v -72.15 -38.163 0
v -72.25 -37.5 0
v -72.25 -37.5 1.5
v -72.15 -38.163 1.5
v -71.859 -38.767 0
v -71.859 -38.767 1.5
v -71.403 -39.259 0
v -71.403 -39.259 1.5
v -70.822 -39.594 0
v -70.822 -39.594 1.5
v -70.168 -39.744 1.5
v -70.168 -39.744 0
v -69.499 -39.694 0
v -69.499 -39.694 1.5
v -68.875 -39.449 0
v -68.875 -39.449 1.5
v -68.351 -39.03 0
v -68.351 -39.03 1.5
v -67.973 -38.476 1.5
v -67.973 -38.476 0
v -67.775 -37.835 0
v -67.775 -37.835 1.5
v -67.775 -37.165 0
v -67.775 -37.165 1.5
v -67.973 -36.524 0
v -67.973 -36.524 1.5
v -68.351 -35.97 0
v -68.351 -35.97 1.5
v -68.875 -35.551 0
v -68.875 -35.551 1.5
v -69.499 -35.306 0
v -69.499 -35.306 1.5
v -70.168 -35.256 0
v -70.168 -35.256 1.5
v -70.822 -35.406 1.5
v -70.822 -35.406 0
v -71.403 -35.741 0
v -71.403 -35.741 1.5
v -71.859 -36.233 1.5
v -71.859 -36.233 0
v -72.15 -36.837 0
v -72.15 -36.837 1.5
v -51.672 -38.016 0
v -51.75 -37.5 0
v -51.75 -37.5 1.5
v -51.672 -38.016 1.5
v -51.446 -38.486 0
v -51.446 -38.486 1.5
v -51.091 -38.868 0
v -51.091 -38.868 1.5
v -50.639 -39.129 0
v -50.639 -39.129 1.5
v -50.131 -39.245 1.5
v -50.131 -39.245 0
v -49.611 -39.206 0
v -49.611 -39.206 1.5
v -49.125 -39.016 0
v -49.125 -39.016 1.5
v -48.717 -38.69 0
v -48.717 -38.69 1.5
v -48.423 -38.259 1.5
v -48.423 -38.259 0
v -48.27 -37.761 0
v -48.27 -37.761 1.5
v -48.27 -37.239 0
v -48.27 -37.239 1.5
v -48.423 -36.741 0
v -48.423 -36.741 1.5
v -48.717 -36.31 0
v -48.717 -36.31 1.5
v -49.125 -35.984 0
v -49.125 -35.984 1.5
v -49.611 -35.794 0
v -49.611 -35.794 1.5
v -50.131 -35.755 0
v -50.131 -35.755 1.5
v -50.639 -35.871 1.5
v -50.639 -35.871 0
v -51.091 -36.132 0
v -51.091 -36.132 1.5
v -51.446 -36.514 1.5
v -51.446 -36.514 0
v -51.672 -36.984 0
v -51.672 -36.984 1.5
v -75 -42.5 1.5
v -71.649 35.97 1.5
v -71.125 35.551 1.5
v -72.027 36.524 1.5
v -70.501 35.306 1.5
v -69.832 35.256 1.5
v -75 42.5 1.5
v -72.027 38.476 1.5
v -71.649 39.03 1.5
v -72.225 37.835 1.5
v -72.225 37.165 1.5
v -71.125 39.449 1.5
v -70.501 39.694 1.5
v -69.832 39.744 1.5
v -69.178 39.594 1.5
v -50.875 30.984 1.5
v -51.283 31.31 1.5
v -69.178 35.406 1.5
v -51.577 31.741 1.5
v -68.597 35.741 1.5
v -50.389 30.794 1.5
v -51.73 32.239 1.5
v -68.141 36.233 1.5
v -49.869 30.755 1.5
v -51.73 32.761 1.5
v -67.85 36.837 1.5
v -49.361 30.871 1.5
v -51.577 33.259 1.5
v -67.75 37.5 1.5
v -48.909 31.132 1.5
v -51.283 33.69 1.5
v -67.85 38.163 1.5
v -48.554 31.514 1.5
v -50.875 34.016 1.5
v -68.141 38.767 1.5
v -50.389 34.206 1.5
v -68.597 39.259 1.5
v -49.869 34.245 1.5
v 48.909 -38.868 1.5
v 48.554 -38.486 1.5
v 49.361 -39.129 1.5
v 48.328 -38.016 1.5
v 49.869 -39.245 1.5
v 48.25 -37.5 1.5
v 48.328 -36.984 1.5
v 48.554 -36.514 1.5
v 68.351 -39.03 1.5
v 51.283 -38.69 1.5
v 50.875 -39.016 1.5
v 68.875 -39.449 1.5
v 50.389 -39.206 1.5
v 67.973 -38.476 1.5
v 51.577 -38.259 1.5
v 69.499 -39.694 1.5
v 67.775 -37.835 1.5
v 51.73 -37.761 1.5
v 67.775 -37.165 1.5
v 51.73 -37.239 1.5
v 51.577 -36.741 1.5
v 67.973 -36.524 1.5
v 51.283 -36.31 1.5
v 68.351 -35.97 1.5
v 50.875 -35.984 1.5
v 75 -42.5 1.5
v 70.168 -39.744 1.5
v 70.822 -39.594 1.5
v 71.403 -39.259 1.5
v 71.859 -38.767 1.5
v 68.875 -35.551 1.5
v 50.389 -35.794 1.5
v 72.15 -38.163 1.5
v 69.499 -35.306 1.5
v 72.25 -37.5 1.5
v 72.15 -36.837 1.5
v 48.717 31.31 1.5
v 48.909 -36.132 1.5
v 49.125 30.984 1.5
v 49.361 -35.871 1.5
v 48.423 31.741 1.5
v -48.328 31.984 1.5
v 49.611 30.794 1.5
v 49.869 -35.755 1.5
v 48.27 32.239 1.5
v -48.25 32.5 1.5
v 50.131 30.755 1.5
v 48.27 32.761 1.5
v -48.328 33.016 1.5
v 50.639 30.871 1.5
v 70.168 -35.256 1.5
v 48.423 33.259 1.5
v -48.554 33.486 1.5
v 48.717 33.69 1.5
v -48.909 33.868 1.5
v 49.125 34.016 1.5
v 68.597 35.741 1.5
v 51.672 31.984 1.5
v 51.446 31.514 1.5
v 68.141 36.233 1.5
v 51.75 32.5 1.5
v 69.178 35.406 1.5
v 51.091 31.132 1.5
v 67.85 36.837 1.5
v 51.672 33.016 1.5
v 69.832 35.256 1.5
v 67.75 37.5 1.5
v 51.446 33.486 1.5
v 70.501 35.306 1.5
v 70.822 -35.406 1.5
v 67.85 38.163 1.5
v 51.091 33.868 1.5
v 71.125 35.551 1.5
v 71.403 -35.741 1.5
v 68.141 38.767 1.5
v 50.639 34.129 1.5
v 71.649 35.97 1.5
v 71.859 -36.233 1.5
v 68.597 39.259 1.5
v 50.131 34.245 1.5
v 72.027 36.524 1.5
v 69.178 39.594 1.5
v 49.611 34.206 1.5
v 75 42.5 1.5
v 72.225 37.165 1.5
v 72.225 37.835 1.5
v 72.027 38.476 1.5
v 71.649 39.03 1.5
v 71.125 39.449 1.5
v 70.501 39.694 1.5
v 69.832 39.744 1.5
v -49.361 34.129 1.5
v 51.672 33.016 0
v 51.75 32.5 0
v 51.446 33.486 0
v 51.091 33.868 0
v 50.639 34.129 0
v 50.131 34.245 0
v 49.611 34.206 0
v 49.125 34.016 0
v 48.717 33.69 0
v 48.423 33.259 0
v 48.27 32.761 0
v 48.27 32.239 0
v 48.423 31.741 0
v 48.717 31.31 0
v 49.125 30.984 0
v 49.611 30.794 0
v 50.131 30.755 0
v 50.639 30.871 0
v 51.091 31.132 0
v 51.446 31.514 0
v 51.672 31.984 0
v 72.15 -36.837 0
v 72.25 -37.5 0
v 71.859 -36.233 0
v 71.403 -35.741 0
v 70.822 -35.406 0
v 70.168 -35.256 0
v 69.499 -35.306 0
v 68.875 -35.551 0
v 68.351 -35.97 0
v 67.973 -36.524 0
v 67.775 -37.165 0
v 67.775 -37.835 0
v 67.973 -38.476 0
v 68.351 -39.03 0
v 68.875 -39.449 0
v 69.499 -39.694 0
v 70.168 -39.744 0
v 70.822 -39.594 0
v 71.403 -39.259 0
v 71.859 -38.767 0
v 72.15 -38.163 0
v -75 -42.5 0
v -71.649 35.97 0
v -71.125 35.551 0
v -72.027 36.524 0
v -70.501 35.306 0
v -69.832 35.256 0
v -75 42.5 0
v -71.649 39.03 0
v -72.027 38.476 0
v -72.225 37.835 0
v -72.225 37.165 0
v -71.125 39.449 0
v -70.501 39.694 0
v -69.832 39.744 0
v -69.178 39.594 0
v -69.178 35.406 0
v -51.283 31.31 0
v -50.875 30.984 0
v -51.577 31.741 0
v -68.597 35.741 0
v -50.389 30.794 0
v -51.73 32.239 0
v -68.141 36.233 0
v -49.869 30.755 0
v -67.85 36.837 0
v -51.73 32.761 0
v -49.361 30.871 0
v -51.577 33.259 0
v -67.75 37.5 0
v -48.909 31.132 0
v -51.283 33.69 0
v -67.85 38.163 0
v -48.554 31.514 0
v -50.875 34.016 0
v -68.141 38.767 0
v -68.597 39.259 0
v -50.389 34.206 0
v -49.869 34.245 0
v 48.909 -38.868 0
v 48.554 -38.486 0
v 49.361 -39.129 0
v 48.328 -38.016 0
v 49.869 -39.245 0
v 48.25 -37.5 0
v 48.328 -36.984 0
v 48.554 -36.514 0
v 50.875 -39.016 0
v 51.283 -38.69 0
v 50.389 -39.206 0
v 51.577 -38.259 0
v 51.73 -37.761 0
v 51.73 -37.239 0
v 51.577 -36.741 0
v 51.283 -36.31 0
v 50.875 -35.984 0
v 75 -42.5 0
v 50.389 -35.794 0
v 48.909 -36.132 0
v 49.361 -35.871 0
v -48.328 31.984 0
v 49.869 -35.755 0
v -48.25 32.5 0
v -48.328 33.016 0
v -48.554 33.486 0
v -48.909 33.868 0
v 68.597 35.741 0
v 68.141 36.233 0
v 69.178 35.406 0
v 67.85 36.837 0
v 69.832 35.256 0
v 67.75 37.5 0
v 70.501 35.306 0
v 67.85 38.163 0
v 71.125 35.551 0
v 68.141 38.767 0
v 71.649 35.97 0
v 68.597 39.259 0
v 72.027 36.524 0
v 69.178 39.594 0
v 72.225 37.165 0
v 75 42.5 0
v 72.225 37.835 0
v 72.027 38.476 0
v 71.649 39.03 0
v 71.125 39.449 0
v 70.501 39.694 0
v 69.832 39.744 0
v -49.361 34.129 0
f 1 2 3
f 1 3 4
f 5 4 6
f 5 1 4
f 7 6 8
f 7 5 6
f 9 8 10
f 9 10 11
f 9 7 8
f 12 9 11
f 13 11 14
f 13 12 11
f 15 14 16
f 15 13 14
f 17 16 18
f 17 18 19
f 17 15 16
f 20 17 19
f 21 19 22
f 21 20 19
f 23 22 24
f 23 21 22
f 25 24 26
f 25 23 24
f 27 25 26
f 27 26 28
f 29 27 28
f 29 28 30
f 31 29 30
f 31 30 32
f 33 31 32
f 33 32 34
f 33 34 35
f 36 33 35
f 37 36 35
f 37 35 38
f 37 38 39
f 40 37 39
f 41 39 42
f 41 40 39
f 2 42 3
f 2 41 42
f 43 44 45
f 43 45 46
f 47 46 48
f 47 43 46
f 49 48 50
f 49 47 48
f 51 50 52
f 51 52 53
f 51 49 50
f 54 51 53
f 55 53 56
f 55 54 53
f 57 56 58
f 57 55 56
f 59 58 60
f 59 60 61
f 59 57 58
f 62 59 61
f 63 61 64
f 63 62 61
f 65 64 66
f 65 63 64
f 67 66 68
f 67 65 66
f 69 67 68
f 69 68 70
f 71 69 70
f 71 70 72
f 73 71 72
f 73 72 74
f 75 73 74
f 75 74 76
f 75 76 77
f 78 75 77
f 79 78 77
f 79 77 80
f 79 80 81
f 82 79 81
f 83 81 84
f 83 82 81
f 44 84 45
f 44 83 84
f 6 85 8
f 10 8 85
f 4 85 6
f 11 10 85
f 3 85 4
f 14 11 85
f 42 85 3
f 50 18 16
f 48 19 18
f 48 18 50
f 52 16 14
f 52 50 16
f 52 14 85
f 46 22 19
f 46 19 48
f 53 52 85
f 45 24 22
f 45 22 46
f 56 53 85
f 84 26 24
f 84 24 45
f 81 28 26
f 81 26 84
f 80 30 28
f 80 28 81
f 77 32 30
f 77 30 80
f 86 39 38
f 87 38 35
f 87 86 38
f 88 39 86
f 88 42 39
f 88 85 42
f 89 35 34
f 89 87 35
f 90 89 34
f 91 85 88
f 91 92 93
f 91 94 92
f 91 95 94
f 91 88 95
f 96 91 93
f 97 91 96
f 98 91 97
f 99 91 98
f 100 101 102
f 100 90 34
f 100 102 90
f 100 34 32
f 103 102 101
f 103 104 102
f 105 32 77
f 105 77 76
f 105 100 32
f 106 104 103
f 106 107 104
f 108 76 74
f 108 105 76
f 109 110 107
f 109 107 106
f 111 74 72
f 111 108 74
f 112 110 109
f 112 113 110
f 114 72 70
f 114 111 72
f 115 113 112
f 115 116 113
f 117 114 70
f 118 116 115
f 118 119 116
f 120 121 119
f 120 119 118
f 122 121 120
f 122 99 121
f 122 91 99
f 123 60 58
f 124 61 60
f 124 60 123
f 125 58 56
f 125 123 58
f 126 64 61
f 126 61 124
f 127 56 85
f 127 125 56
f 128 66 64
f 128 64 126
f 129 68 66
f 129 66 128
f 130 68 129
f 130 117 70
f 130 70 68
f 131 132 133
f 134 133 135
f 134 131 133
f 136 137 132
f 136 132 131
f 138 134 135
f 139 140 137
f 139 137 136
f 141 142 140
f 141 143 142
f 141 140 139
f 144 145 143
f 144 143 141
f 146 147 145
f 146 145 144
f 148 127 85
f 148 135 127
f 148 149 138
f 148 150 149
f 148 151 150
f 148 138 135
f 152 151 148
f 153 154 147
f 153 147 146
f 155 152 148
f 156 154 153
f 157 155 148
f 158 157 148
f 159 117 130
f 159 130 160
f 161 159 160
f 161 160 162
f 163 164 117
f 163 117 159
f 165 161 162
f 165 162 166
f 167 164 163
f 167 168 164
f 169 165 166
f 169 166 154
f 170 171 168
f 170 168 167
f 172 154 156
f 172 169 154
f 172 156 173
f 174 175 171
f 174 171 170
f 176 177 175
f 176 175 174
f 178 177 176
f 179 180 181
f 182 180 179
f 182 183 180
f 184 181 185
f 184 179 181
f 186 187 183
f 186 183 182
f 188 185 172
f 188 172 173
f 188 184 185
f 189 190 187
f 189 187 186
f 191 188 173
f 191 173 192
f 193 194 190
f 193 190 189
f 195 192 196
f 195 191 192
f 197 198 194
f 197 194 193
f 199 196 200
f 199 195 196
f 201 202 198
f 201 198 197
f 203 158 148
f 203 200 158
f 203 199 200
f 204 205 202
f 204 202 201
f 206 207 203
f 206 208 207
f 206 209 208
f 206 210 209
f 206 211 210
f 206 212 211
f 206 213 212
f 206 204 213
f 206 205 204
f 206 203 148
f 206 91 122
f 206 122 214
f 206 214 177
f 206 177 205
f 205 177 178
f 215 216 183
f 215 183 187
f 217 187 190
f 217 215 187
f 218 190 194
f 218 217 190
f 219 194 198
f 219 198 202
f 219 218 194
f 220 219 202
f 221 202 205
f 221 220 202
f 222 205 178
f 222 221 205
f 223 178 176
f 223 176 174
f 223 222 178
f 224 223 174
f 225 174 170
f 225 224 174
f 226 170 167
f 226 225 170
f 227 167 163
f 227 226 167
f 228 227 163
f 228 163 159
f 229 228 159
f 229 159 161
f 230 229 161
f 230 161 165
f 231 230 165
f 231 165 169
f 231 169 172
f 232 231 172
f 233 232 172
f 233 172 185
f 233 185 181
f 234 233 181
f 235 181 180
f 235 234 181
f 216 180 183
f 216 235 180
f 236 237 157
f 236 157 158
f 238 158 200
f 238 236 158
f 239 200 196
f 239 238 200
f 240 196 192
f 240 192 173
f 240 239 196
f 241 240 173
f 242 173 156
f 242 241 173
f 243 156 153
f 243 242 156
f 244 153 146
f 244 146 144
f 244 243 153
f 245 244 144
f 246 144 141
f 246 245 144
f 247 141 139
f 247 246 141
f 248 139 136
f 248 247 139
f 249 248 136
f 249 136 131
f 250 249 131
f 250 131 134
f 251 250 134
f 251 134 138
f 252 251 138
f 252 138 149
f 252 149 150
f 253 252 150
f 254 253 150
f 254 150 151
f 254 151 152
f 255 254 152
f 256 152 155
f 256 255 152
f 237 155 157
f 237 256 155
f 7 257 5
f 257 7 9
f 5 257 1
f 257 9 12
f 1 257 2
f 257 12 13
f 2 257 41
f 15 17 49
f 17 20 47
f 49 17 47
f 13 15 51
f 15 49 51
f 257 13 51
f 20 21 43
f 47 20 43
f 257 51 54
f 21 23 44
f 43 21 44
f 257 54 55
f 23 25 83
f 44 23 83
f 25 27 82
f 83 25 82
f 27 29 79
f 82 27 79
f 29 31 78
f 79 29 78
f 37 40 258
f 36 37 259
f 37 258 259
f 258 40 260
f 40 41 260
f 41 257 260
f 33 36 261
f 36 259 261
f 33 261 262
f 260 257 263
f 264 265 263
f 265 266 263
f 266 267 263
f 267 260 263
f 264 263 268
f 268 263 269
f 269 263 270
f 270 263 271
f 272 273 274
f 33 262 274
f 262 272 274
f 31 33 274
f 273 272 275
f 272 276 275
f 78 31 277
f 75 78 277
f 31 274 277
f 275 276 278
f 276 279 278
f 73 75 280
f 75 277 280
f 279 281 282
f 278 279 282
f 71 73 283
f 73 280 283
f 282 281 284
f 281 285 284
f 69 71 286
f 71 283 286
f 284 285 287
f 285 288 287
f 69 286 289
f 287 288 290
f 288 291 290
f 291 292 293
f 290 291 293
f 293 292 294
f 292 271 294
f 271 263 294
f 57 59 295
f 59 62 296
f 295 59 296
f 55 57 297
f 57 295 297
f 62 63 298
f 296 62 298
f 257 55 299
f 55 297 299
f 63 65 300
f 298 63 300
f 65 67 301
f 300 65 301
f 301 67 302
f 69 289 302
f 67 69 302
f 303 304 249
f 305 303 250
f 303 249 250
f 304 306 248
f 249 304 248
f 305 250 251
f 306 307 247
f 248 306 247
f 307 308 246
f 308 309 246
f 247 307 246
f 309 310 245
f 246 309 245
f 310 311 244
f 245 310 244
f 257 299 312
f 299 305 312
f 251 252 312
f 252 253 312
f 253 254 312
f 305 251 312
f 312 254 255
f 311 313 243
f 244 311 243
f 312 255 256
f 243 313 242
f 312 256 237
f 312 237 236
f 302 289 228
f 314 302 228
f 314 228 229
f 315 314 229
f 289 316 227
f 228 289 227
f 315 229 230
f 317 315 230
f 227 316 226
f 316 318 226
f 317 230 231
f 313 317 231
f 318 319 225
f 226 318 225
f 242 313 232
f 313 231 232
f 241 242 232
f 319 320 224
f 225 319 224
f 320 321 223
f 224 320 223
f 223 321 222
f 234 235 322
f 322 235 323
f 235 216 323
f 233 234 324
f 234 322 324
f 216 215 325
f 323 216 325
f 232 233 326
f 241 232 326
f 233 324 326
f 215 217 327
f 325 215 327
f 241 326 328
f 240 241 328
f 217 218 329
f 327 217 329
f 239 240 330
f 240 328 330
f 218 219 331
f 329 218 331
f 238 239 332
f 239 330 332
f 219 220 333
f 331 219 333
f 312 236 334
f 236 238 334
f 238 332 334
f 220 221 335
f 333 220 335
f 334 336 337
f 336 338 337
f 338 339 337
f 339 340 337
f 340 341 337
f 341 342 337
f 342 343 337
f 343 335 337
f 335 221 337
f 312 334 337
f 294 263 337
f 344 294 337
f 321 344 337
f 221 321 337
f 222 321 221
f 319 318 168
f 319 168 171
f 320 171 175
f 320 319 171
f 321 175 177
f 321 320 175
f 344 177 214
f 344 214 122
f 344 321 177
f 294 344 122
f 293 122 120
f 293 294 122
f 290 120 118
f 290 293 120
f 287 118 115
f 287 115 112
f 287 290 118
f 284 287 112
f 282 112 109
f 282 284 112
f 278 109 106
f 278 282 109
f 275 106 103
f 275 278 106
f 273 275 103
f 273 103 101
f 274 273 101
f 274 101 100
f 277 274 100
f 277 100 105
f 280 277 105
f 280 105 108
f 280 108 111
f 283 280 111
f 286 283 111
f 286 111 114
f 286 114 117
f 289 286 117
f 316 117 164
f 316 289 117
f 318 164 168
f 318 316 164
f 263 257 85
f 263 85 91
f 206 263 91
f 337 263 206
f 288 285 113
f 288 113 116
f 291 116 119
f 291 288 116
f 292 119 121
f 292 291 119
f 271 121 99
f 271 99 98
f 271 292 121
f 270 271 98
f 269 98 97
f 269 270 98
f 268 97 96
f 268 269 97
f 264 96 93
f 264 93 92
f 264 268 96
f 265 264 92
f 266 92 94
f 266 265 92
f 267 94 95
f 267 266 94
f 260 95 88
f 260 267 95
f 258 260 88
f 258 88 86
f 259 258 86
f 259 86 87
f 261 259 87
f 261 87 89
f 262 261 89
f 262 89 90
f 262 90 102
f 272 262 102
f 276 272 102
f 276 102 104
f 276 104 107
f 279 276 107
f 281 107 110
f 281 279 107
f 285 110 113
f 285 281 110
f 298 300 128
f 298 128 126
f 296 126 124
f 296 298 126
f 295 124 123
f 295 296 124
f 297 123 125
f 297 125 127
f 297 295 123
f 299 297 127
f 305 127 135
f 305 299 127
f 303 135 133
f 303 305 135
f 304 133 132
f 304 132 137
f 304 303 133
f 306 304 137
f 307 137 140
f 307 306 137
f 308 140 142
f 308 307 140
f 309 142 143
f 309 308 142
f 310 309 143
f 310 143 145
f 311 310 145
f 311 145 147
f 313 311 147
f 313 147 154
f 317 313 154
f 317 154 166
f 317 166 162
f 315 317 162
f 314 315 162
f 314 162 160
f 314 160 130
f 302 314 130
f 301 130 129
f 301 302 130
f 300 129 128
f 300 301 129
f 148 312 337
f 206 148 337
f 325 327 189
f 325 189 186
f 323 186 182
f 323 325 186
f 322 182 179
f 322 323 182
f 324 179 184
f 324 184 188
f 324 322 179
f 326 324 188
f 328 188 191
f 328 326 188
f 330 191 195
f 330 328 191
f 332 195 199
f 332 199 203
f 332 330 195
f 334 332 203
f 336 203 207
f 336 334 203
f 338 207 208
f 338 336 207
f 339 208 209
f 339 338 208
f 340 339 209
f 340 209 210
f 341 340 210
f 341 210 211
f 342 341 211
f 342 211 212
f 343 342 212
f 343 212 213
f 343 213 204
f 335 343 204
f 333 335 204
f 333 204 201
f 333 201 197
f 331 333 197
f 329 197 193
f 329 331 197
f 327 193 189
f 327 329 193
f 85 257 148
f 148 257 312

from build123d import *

# Parameters (mm, degrees)
SKETCH_1_W      = 150
SKETCH_1_H      = 85
SKETCH_1_R      = 2.25
SKETCH_1_R_2    = 1.75
EXTRUDE_1_DEPTH = 1.5


with BuildPart() as part:
    # Эскиз1 → Вытянуть1 (new body)
    with BuildSketch(Plane.XY):
        Rectangle(SKETCH_1_W, SKETCH_1_H)
        with Locations((-70, 37.5)):
            Circle(SKETCH_1_R, mode=Mode.SUBTRACT)
        with Locations(Location((-70, -37.5, 0), (0, 0, 180))):
            Circle(SKETCH_1_R, mode=Mode.SUBTRACT)
        with Locations((70, -37.5)):
            Circle(SKETCH_1_R, mode=Mode.SUBTRACT)
        with Locations(Location((70, 37.5, 0), (0, 0, 180))):
            Circle(SKETCH_1_R, mode=Mode.SUBTRACT)
        with Locations((-50, 32.5)):
            Circle(SKETCH_1_R_2, mode=Mode.SUBTRACT)
        with Locations(Location((-50, -37.5, 0), (0, 0, 180))):
            Circle(SKETCH_1_R_2, mode=Mode.SUBTRACT)
        with Locations((50, 32.5)):
            Circle(SKETCH_1_R_2, mode=Mode.SUBTRACT)
        with Locations(Location((50, -37.5, 0), (0, 0, 180))):
            Circle(SKETCH_1_R_2, mode=Mode.SUBTRACT)
    extrude(amount=EXTRUDE_1_DEPTH)


solid = part.part
